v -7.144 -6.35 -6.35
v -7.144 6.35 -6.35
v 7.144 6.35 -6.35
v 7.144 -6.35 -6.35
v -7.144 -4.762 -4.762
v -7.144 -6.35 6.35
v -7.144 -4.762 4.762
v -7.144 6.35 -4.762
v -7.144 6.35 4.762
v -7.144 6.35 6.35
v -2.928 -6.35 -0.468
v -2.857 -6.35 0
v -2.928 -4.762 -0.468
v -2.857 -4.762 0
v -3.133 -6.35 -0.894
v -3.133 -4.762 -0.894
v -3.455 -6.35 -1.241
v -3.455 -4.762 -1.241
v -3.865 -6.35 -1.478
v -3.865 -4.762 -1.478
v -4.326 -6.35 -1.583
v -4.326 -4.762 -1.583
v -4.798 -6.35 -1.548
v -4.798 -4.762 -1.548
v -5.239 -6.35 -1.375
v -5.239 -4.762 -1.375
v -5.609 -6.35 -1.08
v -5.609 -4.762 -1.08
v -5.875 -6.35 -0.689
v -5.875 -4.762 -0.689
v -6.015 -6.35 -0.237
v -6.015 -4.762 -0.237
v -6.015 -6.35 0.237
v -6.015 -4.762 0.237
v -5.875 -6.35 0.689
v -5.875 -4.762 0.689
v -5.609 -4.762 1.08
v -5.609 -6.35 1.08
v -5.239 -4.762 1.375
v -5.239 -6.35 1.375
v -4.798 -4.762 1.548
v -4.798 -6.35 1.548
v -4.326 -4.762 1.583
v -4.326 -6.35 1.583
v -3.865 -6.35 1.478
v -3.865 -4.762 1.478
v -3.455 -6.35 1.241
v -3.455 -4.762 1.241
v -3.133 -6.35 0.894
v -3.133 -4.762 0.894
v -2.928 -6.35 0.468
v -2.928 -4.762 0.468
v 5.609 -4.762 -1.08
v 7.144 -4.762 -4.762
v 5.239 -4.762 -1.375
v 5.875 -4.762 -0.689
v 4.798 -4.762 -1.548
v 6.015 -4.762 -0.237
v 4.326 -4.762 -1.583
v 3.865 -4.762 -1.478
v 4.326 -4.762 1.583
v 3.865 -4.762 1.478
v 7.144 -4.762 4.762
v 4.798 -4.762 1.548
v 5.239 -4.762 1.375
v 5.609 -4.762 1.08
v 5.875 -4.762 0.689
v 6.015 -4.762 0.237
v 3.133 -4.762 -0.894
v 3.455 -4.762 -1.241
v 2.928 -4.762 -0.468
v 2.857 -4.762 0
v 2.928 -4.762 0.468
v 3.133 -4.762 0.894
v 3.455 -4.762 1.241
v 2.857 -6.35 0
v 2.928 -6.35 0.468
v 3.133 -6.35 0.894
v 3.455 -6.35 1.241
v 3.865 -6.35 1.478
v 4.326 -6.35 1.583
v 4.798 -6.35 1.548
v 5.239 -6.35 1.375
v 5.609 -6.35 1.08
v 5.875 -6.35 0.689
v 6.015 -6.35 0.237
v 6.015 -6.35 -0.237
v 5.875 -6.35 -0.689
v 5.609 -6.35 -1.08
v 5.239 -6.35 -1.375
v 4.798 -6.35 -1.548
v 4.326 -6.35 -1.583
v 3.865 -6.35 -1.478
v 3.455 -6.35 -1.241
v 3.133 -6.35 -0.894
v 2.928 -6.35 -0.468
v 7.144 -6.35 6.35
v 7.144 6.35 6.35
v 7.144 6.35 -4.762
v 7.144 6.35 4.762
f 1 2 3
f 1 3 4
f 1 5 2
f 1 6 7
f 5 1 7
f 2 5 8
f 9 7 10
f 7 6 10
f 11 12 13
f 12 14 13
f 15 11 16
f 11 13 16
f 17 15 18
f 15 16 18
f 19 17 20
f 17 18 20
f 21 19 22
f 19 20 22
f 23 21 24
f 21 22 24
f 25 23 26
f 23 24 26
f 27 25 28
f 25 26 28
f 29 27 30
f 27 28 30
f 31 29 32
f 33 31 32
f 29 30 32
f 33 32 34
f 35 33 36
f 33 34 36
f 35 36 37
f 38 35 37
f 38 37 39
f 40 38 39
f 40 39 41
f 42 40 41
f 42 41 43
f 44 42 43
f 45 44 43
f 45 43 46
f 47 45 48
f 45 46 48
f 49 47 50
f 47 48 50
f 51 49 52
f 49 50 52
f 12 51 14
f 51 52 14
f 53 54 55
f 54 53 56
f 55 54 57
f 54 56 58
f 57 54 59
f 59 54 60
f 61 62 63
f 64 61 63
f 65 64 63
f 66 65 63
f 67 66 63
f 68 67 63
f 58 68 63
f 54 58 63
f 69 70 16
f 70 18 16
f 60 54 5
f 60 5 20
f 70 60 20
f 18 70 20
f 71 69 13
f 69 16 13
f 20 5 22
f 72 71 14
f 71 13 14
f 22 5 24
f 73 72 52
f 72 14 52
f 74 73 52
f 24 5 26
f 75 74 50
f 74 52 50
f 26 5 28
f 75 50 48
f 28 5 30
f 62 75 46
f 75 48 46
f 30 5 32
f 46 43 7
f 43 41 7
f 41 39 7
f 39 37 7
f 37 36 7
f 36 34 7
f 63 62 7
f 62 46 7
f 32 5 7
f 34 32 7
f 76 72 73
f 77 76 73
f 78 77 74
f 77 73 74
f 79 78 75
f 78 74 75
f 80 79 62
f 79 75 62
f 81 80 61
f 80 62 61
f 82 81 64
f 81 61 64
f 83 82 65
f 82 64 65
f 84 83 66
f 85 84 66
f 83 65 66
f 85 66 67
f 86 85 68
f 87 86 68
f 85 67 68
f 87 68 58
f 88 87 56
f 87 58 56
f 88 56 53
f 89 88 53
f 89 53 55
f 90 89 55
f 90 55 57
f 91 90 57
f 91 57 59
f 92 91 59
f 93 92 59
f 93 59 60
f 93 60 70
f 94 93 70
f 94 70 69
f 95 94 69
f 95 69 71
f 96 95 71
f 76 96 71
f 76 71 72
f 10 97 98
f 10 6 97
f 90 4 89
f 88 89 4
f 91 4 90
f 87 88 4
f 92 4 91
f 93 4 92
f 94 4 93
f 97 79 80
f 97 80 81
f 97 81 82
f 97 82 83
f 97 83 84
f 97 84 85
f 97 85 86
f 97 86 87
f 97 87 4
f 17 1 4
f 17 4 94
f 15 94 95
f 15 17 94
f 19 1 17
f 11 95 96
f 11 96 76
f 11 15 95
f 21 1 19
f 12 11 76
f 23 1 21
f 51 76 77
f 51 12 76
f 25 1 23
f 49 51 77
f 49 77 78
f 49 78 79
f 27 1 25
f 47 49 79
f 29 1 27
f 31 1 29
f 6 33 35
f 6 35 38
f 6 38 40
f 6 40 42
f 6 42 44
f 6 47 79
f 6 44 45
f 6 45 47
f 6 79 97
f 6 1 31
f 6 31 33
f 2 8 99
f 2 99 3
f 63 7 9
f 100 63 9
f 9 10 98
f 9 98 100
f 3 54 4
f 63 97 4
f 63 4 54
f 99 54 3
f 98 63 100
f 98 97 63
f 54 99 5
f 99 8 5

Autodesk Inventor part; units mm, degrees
ref_plane "YZ Plane" through (0, 0, 0) normal (1, 0, 0) x (0, 1, 0)
ref_plane "XZ Plane" through (0, 0, 0) normal (0, 1, 0) x (-1, 0, 0)
ref_plane "XY Plane" through (0, 0, 0) normal (0, 0, 1) x (1, 0, 0)
sketch "Sketch2" plane through (0, 0, 0) normal (1, 0, 0) x (0, 1, 0)
  line L0 (-6.35, 6.35) -> (6.35, 6.35)
  line L1 (6.35, 6.35) -> (6.35, -6.35)
  line L2 (6.35, -6.35) -> (-6.35, -6.35)
  line L3 (-6.35, -6.35) -> (-6.35, 6.35)
  line L4 (-6.35, 6.35) -> (6.35, -6.35) construction
  line L5 (6.35, 6.35) -> (-6.35, -6.35) construction
  line L6 (-4.7625, 4.7625) -> (4.7625, 4.7625)
  line L7 (4.7625, 4.7625) -> (4.7625, -4.7625)
  line L8 (4.7625, -4.7625) -> (-4.7625, -4.7625)
  line L9 (-4.7625, -4.7625) -> (-4.7625, 4.7625)
  line L10 (-4.7625, 4.7625) -> (4.7625, -4.7625) construction
  line L11 (4.7625, 4.7625) -> (-4.7625, -4.7625) construction
  line L12 (4.7625, 4.7625) -> (6.35, 4.7625)
  line L13 (4.7625, -4.7625) -> (6.35, -4.7625)
  point P0 (0, 0)
  dimension "d0" = 12.7
  dimension "d1" = 12.7
  dimension "d2" = 9.525
  dimension "d3" = 9.525
extrude "Extrusion1" add sketch "Sketch2" along normal mid plane 14.2875 contours L0 L1 L12 L6 L9 L8 L13 L2 L3
sketch "Sketch3" plane through (-7.1437, -4.7625, 4.7625) normal (0, 1, 0) x (1, 0, 0)
  line L0 (0, 0) -> (14.2875, 0) projected
  line L1 (14.2875, 9.525) -> (14.2875, 0) projected
  line L2 (0, 9.525) -> (14.2875, 9.525) projected
  line L3 (0, 0) -> (0, 9.525) projected
  line L4 (-2.8575, 4.7625) -> (17.145, 4.7625) projected
  line L5 (7.1437, 13.6525) -> (7.1437, -4.1275) projected
  circle A0 centre (2.6988, 4.7625) radius 1.5875
  point P0 (7.1437, 4.7625)
  dimension "d6" = 3.175
  dimension "d7" = 4.445
extrude "Extrusion2" cut sketch "Sketch3" against normal through all contours A0 L4 | L4 A0
mirror "Mirror1" about plane through (0, 0, 0) normal (1, 0, 0) of "Extrusion2"
properties part number "halfinchCChannel"
